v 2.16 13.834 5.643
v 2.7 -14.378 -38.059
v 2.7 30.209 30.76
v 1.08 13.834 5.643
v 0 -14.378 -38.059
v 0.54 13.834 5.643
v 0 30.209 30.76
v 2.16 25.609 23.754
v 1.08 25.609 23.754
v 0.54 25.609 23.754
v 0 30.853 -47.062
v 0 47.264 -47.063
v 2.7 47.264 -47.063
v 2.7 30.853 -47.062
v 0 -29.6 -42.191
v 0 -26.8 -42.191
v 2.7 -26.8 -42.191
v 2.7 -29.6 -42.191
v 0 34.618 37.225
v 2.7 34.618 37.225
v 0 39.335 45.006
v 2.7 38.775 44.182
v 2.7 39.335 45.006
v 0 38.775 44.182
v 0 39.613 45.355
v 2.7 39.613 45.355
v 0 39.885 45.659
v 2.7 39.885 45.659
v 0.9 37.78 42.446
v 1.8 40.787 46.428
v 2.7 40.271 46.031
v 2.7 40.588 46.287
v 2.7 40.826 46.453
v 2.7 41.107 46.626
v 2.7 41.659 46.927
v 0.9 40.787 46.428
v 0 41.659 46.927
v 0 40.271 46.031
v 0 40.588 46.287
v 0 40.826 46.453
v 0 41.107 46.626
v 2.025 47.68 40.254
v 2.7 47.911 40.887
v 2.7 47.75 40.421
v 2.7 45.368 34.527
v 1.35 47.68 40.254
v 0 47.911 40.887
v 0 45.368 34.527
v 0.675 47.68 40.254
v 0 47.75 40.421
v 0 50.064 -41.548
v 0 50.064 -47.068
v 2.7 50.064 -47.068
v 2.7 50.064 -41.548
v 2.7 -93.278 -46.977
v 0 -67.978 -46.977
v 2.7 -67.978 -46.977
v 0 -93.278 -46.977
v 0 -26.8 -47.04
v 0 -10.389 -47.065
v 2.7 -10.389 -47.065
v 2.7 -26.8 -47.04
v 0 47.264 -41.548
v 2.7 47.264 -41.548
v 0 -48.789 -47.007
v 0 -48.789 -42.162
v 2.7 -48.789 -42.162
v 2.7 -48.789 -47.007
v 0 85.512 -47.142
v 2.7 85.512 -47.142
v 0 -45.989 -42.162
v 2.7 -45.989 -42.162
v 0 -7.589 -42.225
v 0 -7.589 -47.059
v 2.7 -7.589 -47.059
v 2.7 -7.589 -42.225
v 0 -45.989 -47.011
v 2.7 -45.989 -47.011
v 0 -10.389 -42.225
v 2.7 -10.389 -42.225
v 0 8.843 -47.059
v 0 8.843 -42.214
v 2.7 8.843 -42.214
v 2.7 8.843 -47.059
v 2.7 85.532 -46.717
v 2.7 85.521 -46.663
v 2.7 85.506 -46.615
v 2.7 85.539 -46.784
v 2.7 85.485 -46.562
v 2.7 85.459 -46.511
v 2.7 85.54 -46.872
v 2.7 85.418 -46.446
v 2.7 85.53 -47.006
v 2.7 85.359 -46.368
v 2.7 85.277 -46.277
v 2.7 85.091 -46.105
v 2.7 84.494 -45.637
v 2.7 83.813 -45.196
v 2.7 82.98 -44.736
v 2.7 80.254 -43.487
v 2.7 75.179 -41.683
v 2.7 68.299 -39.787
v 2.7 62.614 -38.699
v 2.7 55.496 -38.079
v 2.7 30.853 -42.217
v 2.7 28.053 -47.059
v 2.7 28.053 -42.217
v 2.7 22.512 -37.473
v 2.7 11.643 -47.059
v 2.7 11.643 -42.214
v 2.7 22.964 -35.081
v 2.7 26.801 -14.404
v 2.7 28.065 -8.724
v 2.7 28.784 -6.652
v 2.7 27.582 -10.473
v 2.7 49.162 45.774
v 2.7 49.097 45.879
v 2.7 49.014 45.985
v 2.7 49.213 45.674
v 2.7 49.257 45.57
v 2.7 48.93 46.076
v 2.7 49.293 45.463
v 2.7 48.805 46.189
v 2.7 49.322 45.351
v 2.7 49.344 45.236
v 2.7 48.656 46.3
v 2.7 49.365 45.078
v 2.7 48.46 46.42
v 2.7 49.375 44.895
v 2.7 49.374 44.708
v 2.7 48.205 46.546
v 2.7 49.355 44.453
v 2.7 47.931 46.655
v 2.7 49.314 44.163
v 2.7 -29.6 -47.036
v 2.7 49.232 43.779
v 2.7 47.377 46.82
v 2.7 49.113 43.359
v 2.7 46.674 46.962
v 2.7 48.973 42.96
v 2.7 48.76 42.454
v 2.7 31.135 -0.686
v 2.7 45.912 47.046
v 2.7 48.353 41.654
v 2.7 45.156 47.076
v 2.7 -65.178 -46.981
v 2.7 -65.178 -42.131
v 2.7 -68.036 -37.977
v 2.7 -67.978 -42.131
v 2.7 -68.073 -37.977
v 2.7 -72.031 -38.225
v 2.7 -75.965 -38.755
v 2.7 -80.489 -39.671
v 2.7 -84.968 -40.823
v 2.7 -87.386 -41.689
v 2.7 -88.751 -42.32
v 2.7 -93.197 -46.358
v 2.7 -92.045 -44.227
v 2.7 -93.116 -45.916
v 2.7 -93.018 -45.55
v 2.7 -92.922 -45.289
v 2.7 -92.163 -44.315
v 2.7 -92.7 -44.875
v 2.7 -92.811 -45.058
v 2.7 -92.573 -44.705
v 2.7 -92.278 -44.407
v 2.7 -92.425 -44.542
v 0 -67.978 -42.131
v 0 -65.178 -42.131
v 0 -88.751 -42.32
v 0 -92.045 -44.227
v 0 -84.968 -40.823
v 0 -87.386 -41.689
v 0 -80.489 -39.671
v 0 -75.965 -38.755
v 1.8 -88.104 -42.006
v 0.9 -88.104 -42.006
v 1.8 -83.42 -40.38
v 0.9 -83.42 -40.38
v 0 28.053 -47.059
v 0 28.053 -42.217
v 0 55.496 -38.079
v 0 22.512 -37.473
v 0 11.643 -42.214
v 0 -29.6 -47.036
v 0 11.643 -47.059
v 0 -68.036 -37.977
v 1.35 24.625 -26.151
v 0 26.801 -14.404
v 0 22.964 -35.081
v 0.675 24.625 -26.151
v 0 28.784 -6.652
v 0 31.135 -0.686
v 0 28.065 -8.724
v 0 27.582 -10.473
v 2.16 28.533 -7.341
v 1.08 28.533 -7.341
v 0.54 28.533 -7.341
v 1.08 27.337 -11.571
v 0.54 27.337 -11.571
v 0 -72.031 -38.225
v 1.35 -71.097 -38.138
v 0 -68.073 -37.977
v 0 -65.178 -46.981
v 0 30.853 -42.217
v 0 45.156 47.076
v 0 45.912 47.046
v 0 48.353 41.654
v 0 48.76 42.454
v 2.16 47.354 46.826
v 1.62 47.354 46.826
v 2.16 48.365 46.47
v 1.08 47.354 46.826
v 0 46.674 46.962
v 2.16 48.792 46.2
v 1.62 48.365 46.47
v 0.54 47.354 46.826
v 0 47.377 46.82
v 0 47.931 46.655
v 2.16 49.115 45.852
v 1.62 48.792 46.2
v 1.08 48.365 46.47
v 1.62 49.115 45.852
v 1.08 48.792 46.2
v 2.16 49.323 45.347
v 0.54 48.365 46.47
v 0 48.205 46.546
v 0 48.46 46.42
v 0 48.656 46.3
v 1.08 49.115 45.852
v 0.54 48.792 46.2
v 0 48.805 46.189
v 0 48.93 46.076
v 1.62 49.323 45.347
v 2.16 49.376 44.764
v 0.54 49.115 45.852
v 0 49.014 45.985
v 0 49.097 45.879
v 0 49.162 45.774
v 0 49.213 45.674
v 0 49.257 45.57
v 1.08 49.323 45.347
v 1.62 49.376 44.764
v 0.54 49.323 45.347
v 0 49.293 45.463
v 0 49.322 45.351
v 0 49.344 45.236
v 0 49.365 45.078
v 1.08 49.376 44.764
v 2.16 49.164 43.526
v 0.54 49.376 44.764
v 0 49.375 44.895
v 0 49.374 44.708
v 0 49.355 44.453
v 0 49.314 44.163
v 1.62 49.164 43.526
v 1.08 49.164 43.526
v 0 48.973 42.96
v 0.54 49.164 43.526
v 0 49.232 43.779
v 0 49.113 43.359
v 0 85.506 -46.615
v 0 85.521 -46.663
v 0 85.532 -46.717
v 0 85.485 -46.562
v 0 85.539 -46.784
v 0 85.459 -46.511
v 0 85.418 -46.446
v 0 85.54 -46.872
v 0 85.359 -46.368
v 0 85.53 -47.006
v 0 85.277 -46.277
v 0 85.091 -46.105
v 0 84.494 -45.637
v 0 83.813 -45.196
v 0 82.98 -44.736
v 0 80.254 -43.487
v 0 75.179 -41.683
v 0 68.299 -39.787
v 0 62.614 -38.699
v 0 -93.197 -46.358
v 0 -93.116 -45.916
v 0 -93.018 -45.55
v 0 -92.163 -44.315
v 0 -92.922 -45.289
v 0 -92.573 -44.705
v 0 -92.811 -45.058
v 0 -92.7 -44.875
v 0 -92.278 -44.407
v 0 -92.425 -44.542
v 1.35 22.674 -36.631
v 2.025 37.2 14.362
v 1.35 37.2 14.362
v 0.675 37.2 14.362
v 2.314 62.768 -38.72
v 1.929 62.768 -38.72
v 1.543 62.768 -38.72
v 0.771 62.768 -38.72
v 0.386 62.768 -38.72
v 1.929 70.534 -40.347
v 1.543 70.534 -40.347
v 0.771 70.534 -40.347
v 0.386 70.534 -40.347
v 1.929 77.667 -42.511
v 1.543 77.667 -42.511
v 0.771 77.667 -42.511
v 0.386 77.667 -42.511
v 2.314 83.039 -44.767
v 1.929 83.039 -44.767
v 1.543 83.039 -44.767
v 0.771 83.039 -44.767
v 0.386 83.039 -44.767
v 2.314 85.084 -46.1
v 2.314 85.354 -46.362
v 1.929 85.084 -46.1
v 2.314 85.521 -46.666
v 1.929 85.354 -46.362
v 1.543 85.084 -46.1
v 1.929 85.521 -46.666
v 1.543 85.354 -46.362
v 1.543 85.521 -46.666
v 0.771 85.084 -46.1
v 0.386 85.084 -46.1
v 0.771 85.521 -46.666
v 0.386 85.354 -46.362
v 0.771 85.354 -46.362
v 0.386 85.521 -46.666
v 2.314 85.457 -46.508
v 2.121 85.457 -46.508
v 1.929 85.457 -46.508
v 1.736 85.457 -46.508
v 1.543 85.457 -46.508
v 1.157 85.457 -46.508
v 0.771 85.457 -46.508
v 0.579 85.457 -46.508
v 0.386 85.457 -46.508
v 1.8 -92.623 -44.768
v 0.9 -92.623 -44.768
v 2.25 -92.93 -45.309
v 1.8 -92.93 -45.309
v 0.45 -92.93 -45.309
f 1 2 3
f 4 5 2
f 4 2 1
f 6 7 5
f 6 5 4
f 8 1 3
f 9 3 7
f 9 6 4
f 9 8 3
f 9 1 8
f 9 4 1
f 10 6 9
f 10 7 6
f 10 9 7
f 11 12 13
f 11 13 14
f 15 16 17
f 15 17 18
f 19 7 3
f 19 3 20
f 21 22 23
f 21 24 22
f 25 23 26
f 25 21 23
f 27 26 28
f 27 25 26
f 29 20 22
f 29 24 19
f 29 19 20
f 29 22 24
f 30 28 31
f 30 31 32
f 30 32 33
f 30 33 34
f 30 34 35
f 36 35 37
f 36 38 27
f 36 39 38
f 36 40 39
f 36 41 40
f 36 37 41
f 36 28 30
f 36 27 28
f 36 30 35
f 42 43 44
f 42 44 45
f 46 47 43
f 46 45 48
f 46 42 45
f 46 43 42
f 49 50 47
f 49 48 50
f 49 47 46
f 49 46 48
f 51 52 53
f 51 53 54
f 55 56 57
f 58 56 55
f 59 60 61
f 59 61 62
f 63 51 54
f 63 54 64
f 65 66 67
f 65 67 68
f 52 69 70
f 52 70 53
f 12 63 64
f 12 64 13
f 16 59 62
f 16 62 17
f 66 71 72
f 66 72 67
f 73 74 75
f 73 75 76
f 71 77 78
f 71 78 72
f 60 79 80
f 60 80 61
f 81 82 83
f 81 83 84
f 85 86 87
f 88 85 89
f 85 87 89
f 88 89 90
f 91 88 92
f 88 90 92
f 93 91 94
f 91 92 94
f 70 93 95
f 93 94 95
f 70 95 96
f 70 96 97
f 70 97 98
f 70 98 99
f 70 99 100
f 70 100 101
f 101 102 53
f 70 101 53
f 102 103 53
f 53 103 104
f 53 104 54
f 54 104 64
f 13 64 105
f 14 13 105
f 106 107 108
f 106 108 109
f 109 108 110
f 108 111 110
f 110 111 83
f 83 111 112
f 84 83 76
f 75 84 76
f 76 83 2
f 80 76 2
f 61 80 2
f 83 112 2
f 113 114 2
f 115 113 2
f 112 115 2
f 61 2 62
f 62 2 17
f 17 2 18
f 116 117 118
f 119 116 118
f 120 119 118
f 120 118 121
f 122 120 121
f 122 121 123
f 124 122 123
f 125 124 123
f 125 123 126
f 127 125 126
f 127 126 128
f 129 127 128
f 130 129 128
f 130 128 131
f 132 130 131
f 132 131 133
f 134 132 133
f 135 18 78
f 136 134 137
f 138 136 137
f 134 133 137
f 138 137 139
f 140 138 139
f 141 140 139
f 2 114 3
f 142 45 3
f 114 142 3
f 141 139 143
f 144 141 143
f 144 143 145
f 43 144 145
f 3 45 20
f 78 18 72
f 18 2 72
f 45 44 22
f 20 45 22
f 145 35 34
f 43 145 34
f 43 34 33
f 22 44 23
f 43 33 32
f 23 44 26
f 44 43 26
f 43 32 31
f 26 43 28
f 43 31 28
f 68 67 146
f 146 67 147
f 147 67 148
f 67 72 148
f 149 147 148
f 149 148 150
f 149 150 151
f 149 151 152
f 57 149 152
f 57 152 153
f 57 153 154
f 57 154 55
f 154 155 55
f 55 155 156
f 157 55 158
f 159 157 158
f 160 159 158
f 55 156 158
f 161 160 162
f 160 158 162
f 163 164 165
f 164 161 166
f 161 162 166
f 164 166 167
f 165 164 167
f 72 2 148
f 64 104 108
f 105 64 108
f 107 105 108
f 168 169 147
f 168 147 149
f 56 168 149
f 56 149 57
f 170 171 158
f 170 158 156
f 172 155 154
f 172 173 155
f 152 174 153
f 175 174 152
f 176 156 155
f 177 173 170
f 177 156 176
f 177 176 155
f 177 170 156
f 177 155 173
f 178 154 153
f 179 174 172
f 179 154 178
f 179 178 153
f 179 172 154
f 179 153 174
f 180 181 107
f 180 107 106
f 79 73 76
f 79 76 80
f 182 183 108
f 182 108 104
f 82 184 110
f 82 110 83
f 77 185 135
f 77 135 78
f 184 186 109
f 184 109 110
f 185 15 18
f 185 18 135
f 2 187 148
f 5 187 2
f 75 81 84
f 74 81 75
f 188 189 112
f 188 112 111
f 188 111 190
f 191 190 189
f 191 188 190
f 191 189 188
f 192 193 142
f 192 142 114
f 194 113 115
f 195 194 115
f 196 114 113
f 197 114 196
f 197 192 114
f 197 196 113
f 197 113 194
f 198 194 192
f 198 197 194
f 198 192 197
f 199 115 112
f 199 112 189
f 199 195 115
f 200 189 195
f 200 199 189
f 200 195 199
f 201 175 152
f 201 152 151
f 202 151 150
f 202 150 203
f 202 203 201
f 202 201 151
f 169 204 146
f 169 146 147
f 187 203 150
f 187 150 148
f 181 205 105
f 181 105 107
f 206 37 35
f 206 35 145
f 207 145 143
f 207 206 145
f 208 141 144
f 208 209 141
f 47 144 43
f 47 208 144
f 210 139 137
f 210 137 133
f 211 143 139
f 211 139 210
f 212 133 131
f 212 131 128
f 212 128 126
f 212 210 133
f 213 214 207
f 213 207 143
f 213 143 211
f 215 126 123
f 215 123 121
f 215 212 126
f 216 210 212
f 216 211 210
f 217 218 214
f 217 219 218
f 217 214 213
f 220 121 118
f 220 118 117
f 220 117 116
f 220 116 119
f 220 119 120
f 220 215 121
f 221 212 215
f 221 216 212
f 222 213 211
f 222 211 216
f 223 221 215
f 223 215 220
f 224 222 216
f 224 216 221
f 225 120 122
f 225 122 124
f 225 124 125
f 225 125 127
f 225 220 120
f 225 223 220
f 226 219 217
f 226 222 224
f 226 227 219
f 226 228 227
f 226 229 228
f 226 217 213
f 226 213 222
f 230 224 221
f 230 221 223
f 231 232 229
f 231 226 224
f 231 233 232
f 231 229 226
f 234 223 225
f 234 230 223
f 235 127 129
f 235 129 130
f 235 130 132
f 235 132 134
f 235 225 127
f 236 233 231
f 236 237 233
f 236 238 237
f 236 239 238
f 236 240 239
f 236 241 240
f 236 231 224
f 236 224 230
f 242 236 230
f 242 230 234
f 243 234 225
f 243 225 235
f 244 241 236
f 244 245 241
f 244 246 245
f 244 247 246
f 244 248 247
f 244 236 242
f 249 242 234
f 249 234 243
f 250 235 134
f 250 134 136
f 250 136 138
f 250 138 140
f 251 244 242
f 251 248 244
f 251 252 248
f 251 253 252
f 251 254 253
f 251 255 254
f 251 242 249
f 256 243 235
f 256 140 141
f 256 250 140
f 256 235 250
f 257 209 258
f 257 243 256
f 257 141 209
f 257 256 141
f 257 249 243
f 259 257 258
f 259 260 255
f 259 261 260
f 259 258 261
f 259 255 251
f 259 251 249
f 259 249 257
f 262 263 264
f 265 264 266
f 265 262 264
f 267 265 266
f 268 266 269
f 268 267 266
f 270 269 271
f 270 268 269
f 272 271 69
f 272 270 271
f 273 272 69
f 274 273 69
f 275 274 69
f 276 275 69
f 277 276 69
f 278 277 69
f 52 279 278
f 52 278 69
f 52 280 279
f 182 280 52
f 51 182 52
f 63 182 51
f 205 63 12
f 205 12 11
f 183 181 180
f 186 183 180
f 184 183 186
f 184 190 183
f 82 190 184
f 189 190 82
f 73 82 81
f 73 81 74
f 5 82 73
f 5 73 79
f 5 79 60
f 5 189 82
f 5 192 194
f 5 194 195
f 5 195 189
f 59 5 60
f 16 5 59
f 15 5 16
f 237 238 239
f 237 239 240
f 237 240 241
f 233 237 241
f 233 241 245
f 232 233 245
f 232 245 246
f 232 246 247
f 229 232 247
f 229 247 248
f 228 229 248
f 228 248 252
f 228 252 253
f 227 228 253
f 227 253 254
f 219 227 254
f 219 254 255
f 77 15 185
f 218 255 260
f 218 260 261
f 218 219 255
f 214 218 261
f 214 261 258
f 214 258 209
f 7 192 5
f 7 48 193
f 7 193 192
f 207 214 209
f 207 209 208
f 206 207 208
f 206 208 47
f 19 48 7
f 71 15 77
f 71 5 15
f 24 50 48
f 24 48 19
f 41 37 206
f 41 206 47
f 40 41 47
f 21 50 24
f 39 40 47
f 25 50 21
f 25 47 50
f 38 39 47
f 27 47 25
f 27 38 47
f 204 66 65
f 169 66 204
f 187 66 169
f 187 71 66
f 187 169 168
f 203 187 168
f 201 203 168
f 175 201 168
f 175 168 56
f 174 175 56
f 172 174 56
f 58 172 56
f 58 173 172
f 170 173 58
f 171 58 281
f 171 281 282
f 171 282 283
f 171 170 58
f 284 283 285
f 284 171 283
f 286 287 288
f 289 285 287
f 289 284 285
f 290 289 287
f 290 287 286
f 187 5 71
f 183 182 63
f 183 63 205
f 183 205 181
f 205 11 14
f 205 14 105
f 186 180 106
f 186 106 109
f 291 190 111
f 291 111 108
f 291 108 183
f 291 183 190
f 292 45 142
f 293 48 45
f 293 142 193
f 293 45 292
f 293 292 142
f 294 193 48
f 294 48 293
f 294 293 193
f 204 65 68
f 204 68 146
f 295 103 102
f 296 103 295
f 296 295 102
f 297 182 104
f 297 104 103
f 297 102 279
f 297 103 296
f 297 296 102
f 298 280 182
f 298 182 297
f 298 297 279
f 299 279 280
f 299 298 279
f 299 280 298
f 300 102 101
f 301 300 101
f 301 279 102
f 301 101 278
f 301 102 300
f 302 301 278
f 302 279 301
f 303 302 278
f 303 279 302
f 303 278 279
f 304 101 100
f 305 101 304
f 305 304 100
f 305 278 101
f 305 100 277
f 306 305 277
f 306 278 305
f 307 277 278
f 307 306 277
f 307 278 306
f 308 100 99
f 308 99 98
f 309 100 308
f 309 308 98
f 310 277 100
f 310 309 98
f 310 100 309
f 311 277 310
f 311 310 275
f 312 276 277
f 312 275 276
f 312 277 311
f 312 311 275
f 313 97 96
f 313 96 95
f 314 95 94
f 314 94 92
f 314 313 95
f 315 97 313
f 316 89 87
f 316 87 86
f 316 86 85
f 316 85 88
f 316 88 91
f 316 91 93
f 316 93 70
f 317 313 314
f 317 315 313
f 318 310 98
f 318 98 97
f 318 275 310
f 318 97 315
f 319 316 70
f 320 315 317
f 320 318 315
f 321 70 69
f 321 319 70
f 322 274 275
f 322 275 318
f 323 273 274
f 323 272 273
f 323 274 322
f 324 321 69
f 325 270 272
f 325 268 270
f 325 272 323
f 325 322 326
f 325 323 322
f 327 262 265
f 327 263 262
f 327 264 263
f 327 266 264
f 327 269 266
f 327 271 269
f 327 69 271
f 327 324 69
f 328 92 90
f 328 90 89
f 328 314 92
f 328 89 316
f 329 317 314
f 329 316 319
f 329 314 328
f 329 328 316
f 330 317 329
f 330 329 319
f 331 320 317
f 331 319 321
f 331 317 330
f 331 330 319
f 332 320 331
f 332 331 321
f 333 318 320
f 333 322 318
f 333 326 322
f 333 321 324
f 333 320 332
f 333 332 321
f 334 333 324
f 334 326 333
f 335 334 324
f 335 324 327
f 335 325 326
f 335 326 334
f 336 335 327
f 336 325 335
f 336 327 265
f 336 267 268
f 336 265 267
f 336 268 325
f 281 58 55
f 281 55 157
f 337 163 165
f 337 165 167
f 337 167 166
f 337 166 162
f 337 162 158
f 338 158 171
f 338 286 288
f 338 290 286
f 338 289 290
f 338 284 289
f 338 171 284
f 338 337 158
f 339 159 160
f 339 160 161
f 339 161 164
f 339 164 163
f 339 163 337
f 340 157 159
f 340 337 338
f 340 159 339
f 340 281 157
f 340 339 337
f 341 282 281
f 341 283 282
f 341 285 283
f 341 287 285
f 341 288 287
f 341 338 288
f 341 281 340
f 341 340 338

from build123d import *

# Parameters (mm, degrees)
SALIENTE_EXTRUIR1_DEPTH = 2.7


with BuildPart() as part:
    # Croquis1 → Saliente-Extruir1 (new body)
    with BuildSketch(Plane.YZ):
        with BuildLine():
            Line((50.064155465, -47.067534137), (50.064155465, -41.548360968))
            Line((50.064155465, -41.548360968), (47.264155465, -41.548360968))
            Line((47.264155465, -41.548360968), (47.264155465, -47.062731671))
            Line((47.264155465, -47.062731671), (30.853386223, -47.061763035))
            Line((30.853386223, -47.061763035), (30.853386223, -42.21693048))
            Line((30.853386223, -42.21693048), (28.053386223, -42.21693048))
            Line((28.053386223, -42.21693048), (28.053386223, -47.059093276))
            Line((28.053386223, -47.059093276), (11.642735672, -47.059093276))
            Line((11.642735672, -47.059093276), (11.642735672, -42.214260722))
            Line((11.642735672, -42.214260722), (8.842735672, -42.214260722))
            Line((8.842735672, -42.214260722), (8.842735672, -47.059093276))
            Line((8.842735672, -47.059093276), (-7.589284622, -47.059093276))
            Line((-7.589284622, -47.059093276), (-7.589284622, -42.224644755))
            Line((-7.589284622, -42.224644755), (-10.389284622, -42.224644755))
            Line((-10.389284622, -42.224644755), (-10.389284622, -47.065198628))
            Line((-10.389284622, -47.065198628), (-26.800014758, -47.040121306))
            Line((-26.800014758, -47.040121306), (-26.800014758, -42.191010057))
            Line((-26.800014758, -42.191010057), (-29.600014758, -42.191010057))
            Line((-29.600014758, -42.191010057), (-29.600014758, -47.035842611))
            Line((-29.600014758, -47.035842611), (-45.988557712, -47.010799194))
            Line((-45.988557712, -47.010799194), (-45.988557712, -42.161654196))
            Line((-45.988557712, -42.161654196), (-48.788557712, -42.161654196))
            Line((-48.788557712, -42.161654196), (-48.788557712, -47.0065205))
            Line((-48.788557712, -47.0065205), (-65.177781836, -46.981476041))
            Line((-65.177781836, -46.981476041), (-65.177781836, -42.131476041))
            Line((-65.177781836, -42.131476041), (-67.977781836, -42.131476041))
            Line((-67.977781836, -42.131476041), (-67.977781836, -46.977097597))
            Line((-67.977781836, -46.977097597), (-93.277781836, -46.977097597))
            add(Edge.make_bspline(
                [(-93.277781836, -46.977097597), (-93.18189011, -46.174781474), (-93.062415858, -45.1747221), (-92.318917636, -44.427844981), (-92.105764404, -44.271573649), (-92.0449928, -44.227097597)],
                knots=[0, 0, 0, 0, 0.743763164, 0.927075916, 1, 1, 1, 1], degree=3))
            add(Edge.make_bspline(
                [(-92.0449928, -44.227097597), (-90.756880888, -43.433276038), (-88.056893467, -41.769361434), (-82.577993979, -40.034501162), (-78.460600187, -39.237788639), (-75.964948435, -38.754904184)],
                knots=[0, 0, 0, 0, 0.264367579, 0.554135964, 1, 1, 1, 1], degree=3))
            add(Edge.make_bspline(
                [(-75.964948435, -38.754904184), (-74.34547887, -38.512314185), (-71.726644132, -38.12002332), (-69.081865258, -38.016574407), (-68.072599626, -37.977097597)],
                knots=[0, 0, 0, 0, 0.618393189, 1, 1, 1, 1], degree=3))
            Line((-68.072599626, -37.977097597), (-68.036182291, -37.977097597))
            Line((-68.036182291, -37.977097597), (-14.377781836, -38.059093276))
            add(Edge.make_bspline(
                [(-14.377781836, -38.059093276), (-9.48263554, -30.465223104), (-0.088318644, -15.891667241), (11.40131096, 1.897290918), (19.839368531, 14.904950582), (25.291082064, 23.281540451), (28.673986537, 28.425441102), (30.209064616, 30.759604208)],
                knots=[0, 0, 0, 0, 0.33054333, 0.634352652, 0.774759444, 0.897791923, 1, 1, 1, 1], degree=3))
            add(Edge.make_bspline(
                [(30.209064616, 30.759604208), (32.825669768, 34.503403378), (36.379896904, 39.588737934), (39.581896311, 45.827909193), (41.360854644, 46.769635372), (41.659064616, 46.927495864)],
                knots=[0, 0, 0, 0, 0.699056578, 0.949553224, 1, 1, 1, 1], degree=3))
            add(Edge.make_bspline(
                [(41.659064616, 46.927495864), (42.801110062, 47.007732625), (44.717786332, 47.142392673), (47.211435726, 46.979305401), (49.611125337, 46.046610037), (49.252809931, 43.170115935), (48.39102063, 41.703725793), (47.911284937, 40.887423293)],
                knots=[0, 0, 0, 0, 0.262398196, 0.440378618, 0.595477593, 0.774812574, 1, 1, 1, 1], degree=3))
            add(Edge.make_bspline(
                [(47.911284937, 40.887423293), (47.862540118, 40.735589847), (47.793730232, 40.52125646), (47.512079427, 39.861446577), (46.711064578, 37.894379756), (45.948121655, 35.982323112), (45.367624024, 34.527495864)],
                knots=[0, 0, 0, 0, 0.069771666, 0.098492117, 0.314069352, 1, 1, 1, 1], degree=3))
            add(Edge.make_bspline(
                [(45.367624024, 34.527495864), (44.111486236, 31.433076876), (41.38368553, 24.713305857), (37.555483502, 15.243358948), (34.065854034, 6.600610588), (32.047891551, 1.58322579), (31.135238415, -0.685978386)],
                knots=[0, 0, 0, 0, 0.263789487, 0.572839347, 0.80680877, 1, 1, 1, 1], degree=3))
            add(Edge.make_bspline(
                [(31.135238415, -0.685978386), (30.608083206, -1.997168161), (29.719537274, -4.207242768), (28.603409167, -7.0900084), (27.825404021, -9.400037124), (27.274005048, -11.767009415), (26.97035134, -13.458127119), (26.800509876, -14.404083303)],
                knots=[0, 0, 0, 0, 0.293827362, 0.495260414, 0.64274926, 0.800165568, 1, 1, 1, 1], degree=3))
            add(Edge.make_bspline(
                [(26.800509876, -14.404083303), (26.471785049, -16.186318296), (25.749496747, -20.102321536), (24.719420371, -25.646090651), (23.769164139, -30.756143455), (23.214984213, -33.732893289), (22.9640056, -35.081028837)],
                knots=[0, 0, 0, 0, 0.258531991, 0.568057591, 0.804378282, 1, 1, 1, 1], degree=3))
            add(Edge.make_bspline(
                [(22.9640056, -35.081028837), (22.868341833, -35.597842053), (22.720682865, -36.395553759), (22.566553172, -37.192037906), (22.512279431, -37.472504136)],
                knots=[0, 0, 0, 0, 0.647869665, 1, 1, 1, 1], degree=3))
            Line((22.512279431, -37.472504136), (55.496451659, -38.078985867))
            add(Edge.make_bspline(
                [(55.496451659, -38.078985867), (57.927924447, -38.23069105), (63.002233618, -38.547288944), (70.411961322, -40.227716027), (77.16001838, -42.232666736), (82.119612572, -44.187612736), (84.628190587, -45.650882843), (85.592784128, -46.565402982), (85.535281658, -46.977532137), (85.512279431, -47.142392673)],
                knots=[0, 0, 0, 0, 0.227073389, 0.473885964, 0.705746601, 0.886968223, 0.962928971, 0.98517079, 1, 1, 1, 1], degree=3))
            Line((85.512279431, -47.142392673), (50.064155465, -47.067534137))
        make_face()
    extrude(amount=SALIENTE_EXTRUIR1_DEPTH)


solid = part.part
